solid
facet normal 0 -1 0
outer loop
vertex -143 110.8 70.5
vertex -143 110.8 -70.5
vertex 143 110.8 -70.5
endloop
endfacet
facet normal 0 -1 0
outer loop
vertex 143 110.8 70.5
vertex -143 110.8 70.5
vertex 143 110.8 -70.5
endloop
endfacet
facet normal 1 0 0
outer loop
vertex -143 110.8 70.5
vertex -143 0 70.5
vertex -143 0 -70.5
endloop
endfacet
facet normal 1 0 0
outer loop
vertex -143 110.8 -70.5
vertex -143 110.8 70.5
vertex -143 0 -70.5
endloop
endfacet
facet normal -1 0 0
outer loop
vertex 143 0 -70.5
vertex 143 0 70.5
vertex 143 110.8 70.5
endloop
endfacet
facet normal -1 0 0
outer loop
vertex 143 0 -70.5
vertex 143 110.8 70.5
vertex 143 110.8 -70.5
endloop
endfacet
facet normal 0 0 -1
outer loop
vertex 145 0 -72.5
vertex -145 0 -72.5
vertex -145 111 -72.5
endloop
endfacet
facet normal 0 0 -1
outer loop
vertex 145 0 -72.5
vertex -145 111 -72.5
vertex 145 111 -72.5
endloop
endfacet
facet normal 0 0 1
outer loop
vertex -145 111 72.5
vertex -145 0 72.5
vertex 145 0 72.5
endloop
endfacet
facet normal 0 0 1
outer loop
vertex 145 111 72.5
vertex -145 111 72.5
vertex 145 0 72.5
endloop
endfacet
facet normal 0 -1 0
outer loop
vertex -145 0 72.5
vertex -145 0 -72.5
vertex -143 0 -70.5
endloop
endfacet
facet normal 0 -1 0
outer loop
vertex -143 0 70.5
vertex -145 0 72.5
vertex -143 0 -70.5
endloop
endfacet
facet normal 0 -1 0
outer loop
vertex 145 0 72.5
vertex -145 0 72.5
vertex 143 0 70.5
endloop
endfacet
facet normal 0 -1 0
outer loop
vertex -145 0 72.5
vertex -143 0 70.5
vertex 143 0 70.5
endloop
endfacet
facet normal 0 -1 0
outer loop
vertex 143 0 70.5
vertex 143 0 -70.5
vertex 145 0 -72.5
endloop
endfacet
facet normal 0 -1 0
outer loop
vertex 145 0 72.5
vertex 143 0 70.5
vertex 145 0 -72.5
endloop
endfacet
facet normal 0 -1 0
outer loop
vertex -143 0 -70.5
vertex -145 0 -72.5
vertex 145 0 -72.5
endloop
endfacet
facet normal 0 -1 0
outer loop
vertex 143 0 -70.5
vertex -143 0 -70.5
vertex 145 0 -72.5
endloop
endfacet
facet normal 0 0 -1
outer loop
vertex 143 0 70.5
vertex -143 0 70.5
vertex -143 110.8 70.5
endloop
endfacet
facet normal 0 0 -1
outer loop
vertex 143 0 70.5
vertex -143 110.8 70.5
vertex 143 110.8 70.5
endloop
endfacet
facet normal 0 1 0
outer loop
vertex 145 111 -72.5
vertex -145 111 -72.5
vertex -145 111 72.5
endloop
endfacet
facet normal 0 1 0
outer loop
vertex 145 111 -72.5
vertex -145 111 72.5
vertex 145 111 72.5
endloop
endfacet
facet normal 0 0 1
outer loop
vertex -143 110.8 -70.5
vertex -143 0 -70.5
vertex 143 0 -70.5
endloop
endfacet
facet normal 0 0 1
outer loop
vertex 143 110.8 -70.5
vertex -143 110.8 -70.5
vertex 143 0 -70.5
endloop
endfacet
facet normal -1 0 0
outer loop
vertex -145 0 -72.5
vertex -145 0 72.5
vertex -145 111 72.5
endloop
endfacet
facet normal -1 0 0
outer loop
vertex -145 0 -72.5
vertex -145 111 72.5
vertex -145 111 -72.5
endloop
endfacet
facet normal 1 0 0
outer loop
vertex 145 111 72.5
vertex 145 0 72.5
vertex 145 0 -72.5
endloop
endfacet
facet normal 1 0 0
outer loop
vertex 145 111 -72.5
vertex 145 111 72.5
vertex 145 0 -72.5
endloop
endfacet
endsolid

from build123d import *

# Parameters (mm, degrees)
SKETCH4_W           = 290
SKETCH4_H           = 145
BOSS_EXTRUDE3_DEPTH = 111
SKETCH5_W           = 286
SKETCH5_H           = 141
CUT_EXTRUDE2_DEPTH  = 110.8


with BuildPart() as part:
    # Sketch4 → Boss-Extrude3 (new body)
    with BuildSketch(Plane(origin=(0, 0, 0), x_dir=(1, 0, 0), z_dir=(0, 1, 0))):
        Rectangle(SKETCH4_W, SKETCH4_H)
    extrude(amount=BOSS_EXTRUDE3_DEPTH)

    # Sketch5 → Cut-Extrude2 (cut)
    with BuildSketch(Plane(origin=(0, 0, 0), x_dir=(1, 0, 0), z_dir=(0, 1, 0))):
        Rectangle(SKETCH5_W, SKETCH5_H)
    extrude(amount=CUT_EXTRUDE2_DEPTH, mode=Mode.SUBTRACT)


solid = part.part
